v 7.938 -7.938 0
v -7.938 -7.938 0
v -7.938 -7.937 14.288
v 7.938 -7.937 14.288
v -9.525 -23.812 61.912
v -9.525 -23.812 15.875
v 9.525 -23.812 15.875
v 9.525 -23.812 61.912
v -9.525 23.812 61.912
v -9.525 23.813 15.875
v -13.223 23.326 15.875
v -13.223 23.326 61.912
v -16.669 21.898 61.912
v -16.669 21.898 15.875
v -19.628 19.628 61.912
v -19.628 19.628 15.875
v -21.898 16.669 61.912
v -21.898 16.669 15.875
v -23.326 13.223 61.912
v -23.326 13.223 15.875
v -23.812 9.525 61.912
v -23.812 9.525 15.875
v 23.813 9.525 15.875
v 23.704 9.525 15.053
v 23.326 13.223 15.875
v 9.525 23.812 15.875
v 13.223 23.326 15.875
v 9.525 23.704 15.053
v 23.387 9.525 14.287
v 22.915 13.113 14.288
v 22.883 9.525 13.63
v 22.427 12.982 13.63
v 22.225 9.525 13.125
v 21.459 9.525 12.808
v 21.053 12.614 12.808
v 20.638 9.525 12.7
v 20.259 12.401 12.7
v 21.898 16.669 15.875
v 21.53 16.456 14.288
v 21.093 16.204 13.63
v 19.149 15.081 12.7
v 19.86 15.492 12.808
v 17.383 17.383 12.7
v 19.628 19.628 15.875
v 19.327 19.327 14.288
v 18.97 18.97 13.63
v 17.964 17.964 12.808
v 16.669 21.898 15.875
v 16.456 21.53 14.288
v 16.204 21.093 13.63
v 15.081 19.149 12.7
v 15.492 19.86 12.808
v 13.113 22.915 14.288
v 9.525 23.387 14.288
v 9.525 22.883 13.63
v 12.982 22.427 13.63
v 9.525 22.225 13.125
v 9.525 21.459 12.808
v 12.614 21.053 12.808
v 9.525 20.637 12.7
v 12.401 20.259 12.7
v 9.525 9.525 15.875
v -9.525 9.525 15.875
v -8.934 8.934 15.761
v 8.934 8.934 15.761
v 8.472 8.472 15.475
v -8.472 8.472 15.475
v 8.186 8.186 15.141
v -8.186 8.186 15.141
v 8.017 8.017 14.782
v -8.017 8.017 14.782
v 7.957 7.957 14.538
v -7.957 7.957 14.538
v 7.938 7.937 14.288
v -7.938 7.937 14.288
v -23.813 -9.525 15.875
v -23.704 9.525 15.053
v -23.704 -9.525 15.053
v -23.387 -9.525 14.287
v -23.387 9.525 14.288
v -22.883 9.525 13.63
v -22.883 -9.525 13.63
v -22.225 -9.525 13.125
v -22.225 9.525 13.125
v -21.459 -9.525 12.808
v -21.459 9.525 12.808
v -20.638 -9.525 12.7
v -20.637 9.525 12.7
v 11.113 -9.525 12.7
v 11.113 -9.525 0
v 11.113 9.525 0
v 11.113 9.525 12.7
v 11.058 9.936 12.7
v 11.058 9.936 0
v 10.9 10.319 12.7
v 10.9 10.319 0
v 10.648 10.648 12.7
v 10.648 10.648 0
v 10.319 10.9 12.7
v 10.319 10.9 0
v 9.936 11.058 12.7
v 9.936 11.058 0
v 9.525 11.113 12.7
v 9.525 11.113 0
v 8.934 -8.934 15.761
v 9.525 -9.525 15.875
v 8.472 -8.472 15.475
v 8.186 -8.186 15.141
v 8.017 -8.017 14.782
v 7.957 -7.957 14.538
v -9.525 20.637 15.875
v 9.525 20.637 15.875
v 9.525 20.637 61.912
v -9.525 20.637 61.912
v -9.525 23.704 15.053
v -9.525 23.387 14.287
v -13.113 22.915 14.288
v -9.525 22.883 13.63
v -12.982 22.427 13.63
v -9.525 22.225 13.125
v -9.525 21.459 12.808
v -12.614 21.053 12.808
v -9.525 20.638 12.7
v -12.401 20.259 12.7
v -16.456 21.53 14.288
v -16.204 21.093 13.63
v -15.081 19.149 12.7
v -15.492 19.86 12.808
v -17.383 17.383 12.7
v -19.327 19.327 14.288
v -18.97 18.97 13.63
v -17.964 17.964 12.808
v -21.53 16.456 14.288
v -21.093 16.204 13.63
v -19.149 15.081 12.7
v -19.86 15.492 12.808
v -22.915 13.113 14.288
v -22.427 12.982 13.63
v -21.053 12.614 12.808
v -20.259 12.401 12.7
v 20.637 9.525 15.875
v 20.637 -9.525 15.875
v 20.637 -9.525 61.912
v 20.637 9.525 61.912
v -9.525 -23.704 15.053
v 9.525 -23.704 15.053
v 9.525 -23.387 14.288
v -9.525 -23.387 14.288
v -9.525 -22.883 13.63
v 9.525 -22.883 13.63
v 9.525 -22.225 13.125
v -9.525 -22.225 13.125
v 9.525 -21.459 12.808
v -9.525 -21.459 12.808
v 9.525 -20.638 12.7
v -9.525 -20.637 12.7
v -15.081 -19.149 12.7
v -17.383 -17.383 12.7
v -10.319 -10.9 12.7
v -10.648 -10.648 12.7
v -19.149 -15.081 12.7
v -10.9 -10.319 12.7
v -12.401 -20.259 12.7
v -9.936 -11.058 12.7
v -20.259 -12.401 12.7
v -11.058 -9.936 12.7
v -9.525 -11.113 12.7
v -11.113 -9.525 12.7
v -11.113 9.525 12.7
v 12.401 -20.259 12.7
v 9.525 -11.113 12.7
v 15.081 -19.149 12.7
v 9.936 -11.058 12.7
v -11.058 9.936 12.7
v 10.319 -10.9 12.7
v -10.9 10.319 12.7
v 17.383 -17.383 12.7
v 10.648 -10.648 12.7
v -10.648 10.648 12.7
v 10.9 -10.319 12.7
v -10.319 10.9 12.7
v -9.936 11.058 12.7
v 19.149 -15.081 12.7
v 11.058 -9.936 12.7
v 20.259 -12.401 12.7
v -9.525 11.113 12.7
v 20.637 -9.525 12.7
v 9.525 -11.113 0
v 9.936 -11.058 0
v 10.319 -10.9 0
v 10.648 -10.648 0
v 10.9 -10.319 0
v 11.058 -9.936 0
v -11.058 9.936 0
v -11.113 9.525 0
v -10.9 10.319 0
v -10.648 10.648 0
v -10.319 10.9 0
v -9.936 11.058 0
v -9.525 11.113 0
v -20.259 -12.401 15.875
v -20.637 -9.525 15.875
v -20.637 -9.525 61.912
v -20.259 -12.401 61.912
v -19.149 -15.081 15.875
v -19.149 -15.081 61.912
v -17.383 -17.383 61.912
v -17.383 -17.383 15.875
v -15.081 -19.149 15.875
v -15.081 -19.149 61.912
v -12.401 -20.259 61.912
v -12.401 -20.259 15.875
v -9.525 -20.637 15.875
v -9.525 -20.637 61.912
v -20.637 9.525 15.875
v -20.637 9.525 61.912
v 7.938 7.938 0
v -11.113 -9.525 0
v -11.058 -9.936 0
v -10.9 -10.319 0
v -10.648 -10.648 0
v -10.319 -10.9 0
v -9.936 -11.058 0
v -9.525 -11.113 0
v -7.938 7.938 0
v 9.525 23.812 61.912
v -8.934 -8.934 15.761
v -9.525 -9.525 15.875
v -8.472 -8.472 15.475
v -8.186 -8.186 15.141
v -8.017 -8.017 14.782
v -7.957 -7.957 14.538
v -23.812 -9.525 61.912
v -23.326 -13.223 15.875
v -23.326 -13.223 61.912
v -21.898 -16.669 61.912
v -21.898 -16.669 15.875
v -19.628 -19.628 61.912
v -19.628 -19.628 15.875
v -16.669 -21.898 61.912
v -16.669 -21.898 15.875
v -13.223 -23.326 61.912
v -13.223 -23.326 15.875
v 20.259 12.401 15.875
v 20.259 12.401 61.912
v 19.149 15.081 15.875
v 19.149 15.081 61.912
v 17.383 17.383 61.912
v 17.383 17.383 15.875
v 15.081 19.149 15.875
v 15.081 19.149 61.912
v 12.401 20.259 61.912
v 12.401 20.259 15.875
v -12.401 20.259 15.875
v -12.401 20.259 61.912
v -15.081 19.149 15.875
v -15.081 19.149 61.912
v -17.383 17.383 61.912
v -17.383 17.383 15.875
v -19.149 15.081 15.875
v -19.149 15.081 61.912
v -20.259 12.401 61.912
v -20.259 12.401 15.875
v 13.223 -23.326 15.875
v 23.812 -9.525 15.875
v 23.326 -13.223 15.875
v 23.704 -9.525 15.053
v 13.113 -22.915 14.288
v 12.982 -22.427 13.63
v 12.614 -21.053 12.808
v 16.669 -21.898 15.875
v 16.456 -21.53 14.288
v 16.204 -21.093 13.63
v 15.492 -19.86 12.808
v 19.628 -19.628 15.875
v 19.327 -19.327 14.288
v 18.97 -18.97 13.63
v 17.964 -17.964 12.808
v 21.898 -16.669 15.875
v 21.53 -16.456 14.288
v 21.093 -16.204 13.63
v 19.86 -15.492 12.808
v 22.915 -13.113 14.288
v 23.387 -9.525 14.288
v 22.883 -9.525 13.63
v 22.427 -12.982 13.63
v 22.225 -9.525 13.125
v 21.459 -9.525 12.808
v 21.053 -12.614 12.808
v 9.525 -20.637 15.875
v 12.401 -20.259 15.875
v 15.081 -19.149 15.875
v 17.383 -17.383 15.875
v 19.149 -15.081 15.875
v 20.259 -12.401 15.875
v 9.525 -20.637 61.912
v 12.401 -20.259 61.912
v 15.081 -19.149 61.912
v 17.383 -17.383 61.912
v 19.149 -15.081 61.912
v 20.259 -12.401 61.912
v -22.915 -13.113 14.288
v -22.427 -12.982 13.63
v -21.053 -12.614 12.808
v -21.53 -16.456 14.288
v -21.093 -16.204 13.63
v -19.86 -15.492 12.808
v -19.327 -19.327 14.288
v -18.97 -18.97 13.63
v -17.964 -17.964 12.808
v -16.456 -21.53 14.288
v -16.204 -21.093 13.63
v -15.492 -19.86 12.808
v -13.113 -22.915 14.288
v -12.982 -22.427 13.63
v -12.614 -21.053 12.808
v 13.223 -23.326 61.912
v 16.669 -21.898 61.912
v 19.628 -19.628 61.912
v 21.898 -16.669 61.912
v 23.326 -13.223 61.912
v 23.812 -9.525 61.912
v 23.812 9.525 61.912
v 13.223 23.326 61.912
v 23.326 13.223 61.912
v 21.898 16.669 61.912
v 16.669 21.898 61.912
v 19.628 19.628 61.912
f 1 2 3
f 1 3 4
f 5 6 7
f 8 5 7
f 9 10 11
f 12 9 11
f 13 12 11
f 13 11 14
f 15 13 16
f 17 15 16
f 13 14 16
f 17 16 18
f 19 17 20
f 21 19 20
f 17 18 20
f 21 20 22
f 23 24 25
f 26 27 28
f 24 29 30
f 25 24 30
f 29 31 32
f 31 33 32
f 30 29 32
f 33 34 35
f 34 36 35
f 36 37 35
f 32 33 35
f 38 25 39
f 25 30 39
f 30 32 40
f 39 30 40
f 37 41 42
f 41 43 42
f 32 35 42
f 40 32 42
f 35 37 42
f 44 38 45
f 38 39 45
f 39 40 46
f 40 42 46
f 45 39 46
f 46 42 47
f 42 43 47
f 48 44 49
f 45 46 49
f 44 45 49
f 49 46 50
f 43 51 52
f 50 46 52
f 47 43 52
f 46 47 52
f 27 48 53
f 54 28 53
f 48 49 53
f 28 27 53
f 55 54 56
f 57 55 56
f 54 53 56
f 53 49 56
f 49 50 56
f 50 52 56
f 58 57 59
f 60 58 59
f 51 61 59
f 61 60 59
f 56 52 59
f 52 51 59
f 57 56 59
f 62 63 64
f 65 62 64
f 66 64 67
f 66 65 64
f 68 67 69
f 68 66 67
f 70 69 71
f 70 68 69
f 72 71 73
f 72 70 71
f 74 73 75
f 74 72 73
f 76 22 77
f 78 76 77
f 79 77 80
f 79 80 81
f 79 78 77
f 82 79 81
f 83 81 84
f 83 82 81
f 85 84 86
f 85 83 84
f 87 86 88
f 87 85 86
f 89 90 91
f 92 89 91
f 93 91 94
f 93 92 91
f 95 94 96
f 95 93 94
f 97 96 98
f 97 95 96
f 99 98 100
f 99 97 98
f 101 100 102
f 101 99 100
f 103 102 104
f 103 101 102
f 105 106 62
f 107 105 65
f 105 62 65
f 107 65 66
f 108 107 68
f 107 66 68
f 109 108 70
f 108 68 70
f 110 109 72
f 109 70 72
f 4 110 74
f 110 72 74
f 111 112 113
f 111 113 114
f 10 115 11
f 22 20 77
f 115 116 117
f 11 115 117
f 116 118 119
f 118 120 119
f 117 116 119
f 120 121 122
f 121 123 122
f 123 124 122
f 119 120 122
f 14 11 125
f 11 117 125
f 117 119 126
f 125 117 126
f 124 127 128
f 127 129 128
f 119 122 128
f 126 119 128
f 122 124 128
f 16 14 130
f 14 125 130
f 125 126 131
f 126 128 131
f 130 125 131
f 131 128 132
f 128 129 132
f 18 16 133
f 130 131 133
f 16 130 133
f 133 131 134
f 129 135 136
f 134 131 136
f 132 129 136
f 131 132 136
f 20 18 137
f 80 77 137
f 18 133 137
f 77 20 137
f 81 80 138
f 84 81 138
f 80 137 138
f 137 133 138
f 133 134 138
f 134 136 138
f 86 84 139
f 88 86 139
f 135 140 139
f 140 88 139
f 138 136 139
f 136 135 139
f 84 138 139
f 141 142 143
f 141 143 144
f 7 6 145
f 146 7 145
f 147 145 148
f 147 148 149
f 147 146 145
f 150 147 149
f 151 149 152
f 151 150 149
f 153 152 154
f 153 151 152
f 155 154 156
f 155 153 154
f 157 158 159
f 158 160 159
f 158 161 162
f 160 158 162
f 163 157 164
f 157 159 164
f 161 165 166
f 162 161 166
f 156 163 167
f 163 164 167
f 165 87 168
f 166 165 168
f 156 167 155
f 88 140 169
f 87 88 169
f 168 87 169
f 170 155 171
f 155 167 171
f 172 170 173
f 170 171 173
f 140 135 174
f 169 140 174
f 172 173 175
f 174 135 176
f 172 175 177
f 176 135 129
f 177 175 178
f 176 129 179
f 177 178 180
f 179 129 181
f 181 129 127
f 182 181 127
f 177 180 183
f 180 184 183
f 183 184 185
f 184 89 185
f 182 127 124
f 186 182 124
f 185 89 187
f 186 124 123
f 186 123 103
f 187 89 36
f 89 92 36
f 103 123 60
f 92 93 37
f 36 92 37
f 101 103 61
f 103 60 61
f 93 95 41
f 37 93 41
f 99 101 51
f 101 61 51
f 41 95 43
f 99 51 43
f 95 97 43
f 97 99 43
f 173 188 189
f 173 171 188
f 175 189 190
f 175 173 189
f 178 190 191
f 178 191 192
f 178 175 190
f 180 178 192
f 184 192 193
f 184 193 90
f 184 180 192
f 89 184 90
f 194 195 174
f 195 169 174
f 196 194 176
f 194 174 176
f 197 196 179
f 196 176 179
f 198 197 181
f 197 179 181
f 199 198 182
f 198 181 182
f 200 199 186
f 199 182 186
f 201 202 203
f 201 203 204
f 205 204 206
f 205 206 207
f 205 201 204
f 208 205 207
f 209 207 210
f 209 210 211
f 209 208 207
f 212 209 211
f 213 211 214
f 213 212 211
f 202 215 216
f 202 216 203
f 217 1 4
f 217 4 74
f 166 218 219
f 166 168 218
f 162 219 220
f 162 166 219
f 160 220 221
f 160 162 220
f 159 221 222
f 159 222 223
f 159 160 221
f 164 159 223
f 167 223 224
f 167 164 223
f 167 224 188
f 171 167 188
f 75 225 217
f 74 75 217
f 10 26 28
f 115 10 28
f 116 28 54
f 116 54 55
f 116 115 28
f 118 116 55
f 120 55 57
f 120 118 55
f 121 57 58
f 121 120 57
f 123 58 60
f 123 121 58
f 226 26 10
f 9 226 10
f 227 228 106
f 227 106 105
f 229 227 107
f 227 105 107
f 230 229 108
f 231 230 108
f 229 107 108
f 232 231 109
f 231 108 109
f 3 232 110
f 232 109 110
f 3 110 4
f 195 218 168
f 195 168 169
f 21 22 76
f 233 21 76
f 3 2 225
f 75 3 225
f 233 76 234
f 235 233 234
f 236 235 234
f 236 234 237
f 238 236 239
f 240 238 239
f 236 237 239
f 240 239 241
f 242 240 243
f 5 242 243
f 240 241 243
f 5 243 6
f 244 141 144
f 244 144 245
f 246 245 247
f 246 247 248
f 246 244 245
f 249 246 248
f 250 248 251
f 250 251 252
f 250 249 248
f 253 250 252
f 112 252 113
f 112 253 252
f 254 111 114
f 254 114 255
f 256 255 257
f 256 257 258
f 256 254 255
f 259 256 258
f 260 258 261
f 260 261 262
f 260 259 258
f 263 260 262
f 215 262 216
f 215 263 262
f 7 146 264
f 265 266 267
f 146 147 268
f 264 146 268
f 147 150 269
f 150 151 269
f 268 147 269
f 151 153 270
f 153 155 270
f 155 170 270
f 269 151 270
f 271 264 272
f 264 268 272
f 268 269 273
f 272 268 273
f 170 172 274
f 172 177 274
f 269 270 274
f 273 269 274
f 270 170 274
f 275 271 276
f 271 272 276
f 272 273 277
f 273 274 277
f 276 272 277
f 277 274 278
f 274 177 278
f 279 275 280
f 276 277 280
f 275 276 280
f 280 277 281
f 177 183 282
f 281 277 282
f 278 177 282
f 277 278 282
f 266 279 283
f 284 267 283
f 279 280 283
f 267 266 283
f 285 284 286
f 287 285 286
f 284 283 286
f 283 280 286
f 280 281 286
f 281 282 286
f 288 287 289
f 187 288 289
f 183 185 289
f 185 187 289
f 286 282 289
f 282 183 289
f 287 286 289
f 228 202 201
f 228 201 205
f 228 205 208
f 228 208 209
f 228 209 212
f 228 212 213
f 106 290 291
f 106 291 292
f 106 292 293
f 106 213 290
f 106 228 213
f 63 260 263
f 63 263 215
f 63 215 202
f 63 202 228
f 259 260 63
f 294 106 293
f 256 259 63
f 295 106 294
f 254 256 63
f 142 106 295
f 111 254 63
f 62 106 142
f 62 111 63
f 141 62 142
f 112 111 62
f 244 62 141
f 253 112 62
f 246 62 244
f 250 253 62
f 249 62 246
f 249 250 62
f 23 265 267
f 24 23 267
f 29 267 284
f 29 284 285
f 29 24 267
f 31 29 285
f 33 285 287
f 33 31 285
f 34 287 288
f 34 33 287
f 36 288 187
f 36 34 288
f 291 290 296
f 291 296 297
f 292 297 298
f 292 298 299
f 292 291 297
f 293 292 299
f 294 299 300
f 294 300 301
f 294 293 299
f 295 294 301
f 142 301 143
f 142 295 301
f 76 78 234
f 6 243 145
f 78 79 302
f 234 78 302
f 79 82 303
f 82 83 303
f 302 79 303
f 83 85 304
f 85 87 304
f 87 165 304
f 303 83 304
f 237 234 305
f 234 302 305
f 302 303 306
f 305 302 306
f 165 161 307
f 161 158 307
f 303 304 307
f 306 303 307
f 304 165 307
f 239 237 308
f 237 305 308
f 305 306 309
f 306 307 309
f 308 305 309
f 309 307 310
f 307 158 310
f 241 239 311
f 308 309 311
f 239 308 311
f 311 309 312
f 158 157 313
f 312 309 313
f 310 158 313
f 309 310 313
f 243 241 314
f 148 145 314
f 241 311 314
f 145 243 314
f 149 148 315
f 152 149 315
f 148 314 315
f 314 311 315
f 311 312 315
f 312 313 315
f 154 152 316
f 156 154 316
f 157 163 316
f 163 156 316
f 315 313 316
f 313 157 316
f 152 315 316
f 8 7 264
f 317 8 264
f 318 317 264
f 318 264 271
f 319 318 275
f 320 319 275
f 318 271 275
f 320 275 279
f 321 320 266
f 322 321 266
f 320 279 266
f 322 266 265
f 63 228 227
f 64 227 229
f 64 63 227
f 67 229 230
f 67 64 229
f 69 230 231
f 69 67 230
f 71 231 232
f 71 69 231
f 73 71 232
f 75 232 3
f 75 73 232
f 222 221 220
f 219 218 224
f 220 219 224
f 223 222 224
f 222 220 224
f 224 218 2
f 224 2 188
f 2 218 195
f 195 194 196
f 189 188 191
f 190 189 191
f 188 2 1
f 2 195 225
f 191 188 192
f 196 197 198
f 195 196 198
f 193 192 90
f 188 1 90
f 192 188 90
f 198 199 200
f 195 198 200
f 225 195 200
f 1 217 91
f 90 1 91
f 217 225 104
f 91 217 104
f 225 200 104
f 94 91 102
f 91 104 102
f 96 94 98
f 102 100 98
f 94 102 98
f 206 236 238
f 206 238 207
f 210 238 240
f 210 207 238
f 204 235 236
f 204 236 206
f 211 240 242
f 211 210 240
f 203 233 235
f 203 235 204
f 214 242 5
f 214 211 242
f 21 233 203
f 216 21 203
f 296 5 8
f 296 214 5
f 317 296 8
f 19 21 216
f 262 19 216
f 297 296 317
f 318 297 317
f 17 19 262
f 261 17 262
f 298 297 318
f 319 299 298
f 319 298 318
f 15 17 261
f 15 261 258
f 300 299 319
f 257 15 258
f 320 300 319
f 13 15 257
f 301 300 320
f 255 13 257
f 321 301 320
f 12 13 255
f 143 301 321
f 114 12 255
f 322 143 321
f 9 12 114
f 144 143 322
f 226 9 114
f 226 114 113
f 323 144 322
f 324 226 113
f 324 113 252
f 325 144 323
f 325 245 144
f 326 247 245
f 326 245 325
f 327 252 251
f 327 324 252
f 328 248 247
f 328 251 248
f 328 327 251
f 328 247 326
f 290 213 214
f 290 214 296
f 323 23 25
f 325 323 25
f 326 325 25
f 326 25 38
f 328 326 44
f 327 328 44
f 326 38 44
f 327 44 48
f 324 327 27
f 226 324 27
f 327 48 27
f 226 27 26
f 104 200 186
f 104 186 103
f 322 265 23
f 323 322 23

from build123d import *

# Parameters (mm, degrees)
SKETCH1_W           = 22.225
SKETCH1_H           = 22.225
BASE_EXTRUDE_DEPTH  = 12.7
FILLET1_R           = 1.5875
BOSS_EXTRUDE1_DEPTH = 49.2125
FILLET2_R           = 3.175
SHELL1_START        = 15.875
SHELL1_DEPTH        = 46.0375
SHELL1_2_OUTLINE_W  = 15.875
SHELL1_2_OUTLINE_H  = 15.875
SHELL1_2_DEPTH      = 15.875
FILLET4_R           = 1.5875


# Read off the part's stored shape, not the designer's step: Shell1
with BuildPart() as part:
    # Sketch1 → Base-Extrude (new body)
    with BuildSketch(Plane.XY):
        Rectangle(SKETCH1_W, SKETCH1_H)
    extrude(amount=BASE_EXTRUDE_DEPTH)

    # Fillet1
    fillet1_edges = [part.edges().sort_by_distance(p)[0] for p in [
        (-11.1125, 11.1125, 6.35),
        (11.1125, 11.1125, 6.35),
        (11.1125, -11.1125, 6.35),
        (-11.1125, -11.1125, 6.35),
    ]]
    fillet(fillet1_edges, radius=FILLET1_R)

    # Sketch2 → Boss-Extrude1 (add)
    with BuildSketch(Plane.XY.offset(12.7)):
        with BuildLine():
            Line((23.8125, -9.525), (23.8125, 9.525))
            ThreePointArc((23.8125, 9.525), (19.627788136, 19.627788136), (9.525, 23.8125))
            Line((9.525, 23.8125), (-9.525, 23.8125))
            ThreePointArc((-9.525, 23.8125), (-19.627788136, 19.627788136), (-23.8125, 9.525))
            Line((-23.8125, 9.525), (-23.8125, -9.525))
            ThreePointArc((-23.8125, -9.525), (-19.627788136, -19.627788136), (-9.525, -23.8125))
            Line((-9.525, -23.8125), (9.525, -23.8125))
            ThreePointArc((9.525, -23.8125), (19.627788136, -19.627788136), (23.8125, -9.525))
        make_face()
    extrude(amount=BOSS_EXTRUDE1_DEPTH)

    # Fillet2
    fillet2_edges = [part.edges().sort_by_distance(p)[0] for p in [
        (19.627788136, -19.627788136, 12.7),
        (23.8125, 0, 12.7),
        (19.627788136, 19.627788136, 12.7),
        (0, 23.8125, 12.7),
        (-19.627788136, 19.627788136, 12.7),
        (-23.8125, 0, 12.7),
        (-19.627788136, -19.627788136, 12.7),
        (0, -23.8125, 12.7),
    ]]
    fillet(fillet2_edges, radius=FILLET2_R)

    # Shell1 outline → Shell1 (cut)
    with BuildSketch(Plane.XY.offset(SHELL1_START)):
        with BuildLine():
            ThreePointArc((9.525, -20.6375), (17.382724106, -17.382724106), (20.6375, -9.525))
            Line((20.6375, -9.525), (20.6375, 9.525))
            ThreePointArc((20.6375, 9.525), (17.382724106, 17.382724106), (9.525, 20.6375))
            Line((9.525, 20.6375), (-9.525, 20.6375))
            ThreePointArc((-9.525, 20.6375), (-17.382724106, 17.382724106), (-20.6375, 9.525))
            Line((-20.6375, 9.525), (-20.6375, -9.525))
            ThreePointArc((-20.6375, -9.525), (-17.382724106, -17.382724106), (-9.525, -20.6375))
            Line((-9.525, -20.6375), (9.525, -20.6375))
        make_face()
    extrude(amount=SHELL1_DEPTH, mode=Mode.SUBTRACT)

    # Shell1 2 outline → Shell1 2 (cut)
    with BuildSketch(Plane.XY):
        Rectangle(SHELL1_2_OUTLINE_W, SHELL1_2_OUTLINE_H)
    extrude(amount=SHELL1_2_DEPTH, mode=Mode.SUBTRACT)

    # Fillet4
    fillet4_edges = [part.edges().sort_by_distance(p)[0] for p in [
        (0, -7.9375, 15.875),
        (0, 7.9375, 15.875),
        (-7.9375, 0, 15.875),
        (7.9375, 0, 15.875),
    ]]
    fillet(fillet4_edges, radius=FILLET4_R)


solid = part.part
